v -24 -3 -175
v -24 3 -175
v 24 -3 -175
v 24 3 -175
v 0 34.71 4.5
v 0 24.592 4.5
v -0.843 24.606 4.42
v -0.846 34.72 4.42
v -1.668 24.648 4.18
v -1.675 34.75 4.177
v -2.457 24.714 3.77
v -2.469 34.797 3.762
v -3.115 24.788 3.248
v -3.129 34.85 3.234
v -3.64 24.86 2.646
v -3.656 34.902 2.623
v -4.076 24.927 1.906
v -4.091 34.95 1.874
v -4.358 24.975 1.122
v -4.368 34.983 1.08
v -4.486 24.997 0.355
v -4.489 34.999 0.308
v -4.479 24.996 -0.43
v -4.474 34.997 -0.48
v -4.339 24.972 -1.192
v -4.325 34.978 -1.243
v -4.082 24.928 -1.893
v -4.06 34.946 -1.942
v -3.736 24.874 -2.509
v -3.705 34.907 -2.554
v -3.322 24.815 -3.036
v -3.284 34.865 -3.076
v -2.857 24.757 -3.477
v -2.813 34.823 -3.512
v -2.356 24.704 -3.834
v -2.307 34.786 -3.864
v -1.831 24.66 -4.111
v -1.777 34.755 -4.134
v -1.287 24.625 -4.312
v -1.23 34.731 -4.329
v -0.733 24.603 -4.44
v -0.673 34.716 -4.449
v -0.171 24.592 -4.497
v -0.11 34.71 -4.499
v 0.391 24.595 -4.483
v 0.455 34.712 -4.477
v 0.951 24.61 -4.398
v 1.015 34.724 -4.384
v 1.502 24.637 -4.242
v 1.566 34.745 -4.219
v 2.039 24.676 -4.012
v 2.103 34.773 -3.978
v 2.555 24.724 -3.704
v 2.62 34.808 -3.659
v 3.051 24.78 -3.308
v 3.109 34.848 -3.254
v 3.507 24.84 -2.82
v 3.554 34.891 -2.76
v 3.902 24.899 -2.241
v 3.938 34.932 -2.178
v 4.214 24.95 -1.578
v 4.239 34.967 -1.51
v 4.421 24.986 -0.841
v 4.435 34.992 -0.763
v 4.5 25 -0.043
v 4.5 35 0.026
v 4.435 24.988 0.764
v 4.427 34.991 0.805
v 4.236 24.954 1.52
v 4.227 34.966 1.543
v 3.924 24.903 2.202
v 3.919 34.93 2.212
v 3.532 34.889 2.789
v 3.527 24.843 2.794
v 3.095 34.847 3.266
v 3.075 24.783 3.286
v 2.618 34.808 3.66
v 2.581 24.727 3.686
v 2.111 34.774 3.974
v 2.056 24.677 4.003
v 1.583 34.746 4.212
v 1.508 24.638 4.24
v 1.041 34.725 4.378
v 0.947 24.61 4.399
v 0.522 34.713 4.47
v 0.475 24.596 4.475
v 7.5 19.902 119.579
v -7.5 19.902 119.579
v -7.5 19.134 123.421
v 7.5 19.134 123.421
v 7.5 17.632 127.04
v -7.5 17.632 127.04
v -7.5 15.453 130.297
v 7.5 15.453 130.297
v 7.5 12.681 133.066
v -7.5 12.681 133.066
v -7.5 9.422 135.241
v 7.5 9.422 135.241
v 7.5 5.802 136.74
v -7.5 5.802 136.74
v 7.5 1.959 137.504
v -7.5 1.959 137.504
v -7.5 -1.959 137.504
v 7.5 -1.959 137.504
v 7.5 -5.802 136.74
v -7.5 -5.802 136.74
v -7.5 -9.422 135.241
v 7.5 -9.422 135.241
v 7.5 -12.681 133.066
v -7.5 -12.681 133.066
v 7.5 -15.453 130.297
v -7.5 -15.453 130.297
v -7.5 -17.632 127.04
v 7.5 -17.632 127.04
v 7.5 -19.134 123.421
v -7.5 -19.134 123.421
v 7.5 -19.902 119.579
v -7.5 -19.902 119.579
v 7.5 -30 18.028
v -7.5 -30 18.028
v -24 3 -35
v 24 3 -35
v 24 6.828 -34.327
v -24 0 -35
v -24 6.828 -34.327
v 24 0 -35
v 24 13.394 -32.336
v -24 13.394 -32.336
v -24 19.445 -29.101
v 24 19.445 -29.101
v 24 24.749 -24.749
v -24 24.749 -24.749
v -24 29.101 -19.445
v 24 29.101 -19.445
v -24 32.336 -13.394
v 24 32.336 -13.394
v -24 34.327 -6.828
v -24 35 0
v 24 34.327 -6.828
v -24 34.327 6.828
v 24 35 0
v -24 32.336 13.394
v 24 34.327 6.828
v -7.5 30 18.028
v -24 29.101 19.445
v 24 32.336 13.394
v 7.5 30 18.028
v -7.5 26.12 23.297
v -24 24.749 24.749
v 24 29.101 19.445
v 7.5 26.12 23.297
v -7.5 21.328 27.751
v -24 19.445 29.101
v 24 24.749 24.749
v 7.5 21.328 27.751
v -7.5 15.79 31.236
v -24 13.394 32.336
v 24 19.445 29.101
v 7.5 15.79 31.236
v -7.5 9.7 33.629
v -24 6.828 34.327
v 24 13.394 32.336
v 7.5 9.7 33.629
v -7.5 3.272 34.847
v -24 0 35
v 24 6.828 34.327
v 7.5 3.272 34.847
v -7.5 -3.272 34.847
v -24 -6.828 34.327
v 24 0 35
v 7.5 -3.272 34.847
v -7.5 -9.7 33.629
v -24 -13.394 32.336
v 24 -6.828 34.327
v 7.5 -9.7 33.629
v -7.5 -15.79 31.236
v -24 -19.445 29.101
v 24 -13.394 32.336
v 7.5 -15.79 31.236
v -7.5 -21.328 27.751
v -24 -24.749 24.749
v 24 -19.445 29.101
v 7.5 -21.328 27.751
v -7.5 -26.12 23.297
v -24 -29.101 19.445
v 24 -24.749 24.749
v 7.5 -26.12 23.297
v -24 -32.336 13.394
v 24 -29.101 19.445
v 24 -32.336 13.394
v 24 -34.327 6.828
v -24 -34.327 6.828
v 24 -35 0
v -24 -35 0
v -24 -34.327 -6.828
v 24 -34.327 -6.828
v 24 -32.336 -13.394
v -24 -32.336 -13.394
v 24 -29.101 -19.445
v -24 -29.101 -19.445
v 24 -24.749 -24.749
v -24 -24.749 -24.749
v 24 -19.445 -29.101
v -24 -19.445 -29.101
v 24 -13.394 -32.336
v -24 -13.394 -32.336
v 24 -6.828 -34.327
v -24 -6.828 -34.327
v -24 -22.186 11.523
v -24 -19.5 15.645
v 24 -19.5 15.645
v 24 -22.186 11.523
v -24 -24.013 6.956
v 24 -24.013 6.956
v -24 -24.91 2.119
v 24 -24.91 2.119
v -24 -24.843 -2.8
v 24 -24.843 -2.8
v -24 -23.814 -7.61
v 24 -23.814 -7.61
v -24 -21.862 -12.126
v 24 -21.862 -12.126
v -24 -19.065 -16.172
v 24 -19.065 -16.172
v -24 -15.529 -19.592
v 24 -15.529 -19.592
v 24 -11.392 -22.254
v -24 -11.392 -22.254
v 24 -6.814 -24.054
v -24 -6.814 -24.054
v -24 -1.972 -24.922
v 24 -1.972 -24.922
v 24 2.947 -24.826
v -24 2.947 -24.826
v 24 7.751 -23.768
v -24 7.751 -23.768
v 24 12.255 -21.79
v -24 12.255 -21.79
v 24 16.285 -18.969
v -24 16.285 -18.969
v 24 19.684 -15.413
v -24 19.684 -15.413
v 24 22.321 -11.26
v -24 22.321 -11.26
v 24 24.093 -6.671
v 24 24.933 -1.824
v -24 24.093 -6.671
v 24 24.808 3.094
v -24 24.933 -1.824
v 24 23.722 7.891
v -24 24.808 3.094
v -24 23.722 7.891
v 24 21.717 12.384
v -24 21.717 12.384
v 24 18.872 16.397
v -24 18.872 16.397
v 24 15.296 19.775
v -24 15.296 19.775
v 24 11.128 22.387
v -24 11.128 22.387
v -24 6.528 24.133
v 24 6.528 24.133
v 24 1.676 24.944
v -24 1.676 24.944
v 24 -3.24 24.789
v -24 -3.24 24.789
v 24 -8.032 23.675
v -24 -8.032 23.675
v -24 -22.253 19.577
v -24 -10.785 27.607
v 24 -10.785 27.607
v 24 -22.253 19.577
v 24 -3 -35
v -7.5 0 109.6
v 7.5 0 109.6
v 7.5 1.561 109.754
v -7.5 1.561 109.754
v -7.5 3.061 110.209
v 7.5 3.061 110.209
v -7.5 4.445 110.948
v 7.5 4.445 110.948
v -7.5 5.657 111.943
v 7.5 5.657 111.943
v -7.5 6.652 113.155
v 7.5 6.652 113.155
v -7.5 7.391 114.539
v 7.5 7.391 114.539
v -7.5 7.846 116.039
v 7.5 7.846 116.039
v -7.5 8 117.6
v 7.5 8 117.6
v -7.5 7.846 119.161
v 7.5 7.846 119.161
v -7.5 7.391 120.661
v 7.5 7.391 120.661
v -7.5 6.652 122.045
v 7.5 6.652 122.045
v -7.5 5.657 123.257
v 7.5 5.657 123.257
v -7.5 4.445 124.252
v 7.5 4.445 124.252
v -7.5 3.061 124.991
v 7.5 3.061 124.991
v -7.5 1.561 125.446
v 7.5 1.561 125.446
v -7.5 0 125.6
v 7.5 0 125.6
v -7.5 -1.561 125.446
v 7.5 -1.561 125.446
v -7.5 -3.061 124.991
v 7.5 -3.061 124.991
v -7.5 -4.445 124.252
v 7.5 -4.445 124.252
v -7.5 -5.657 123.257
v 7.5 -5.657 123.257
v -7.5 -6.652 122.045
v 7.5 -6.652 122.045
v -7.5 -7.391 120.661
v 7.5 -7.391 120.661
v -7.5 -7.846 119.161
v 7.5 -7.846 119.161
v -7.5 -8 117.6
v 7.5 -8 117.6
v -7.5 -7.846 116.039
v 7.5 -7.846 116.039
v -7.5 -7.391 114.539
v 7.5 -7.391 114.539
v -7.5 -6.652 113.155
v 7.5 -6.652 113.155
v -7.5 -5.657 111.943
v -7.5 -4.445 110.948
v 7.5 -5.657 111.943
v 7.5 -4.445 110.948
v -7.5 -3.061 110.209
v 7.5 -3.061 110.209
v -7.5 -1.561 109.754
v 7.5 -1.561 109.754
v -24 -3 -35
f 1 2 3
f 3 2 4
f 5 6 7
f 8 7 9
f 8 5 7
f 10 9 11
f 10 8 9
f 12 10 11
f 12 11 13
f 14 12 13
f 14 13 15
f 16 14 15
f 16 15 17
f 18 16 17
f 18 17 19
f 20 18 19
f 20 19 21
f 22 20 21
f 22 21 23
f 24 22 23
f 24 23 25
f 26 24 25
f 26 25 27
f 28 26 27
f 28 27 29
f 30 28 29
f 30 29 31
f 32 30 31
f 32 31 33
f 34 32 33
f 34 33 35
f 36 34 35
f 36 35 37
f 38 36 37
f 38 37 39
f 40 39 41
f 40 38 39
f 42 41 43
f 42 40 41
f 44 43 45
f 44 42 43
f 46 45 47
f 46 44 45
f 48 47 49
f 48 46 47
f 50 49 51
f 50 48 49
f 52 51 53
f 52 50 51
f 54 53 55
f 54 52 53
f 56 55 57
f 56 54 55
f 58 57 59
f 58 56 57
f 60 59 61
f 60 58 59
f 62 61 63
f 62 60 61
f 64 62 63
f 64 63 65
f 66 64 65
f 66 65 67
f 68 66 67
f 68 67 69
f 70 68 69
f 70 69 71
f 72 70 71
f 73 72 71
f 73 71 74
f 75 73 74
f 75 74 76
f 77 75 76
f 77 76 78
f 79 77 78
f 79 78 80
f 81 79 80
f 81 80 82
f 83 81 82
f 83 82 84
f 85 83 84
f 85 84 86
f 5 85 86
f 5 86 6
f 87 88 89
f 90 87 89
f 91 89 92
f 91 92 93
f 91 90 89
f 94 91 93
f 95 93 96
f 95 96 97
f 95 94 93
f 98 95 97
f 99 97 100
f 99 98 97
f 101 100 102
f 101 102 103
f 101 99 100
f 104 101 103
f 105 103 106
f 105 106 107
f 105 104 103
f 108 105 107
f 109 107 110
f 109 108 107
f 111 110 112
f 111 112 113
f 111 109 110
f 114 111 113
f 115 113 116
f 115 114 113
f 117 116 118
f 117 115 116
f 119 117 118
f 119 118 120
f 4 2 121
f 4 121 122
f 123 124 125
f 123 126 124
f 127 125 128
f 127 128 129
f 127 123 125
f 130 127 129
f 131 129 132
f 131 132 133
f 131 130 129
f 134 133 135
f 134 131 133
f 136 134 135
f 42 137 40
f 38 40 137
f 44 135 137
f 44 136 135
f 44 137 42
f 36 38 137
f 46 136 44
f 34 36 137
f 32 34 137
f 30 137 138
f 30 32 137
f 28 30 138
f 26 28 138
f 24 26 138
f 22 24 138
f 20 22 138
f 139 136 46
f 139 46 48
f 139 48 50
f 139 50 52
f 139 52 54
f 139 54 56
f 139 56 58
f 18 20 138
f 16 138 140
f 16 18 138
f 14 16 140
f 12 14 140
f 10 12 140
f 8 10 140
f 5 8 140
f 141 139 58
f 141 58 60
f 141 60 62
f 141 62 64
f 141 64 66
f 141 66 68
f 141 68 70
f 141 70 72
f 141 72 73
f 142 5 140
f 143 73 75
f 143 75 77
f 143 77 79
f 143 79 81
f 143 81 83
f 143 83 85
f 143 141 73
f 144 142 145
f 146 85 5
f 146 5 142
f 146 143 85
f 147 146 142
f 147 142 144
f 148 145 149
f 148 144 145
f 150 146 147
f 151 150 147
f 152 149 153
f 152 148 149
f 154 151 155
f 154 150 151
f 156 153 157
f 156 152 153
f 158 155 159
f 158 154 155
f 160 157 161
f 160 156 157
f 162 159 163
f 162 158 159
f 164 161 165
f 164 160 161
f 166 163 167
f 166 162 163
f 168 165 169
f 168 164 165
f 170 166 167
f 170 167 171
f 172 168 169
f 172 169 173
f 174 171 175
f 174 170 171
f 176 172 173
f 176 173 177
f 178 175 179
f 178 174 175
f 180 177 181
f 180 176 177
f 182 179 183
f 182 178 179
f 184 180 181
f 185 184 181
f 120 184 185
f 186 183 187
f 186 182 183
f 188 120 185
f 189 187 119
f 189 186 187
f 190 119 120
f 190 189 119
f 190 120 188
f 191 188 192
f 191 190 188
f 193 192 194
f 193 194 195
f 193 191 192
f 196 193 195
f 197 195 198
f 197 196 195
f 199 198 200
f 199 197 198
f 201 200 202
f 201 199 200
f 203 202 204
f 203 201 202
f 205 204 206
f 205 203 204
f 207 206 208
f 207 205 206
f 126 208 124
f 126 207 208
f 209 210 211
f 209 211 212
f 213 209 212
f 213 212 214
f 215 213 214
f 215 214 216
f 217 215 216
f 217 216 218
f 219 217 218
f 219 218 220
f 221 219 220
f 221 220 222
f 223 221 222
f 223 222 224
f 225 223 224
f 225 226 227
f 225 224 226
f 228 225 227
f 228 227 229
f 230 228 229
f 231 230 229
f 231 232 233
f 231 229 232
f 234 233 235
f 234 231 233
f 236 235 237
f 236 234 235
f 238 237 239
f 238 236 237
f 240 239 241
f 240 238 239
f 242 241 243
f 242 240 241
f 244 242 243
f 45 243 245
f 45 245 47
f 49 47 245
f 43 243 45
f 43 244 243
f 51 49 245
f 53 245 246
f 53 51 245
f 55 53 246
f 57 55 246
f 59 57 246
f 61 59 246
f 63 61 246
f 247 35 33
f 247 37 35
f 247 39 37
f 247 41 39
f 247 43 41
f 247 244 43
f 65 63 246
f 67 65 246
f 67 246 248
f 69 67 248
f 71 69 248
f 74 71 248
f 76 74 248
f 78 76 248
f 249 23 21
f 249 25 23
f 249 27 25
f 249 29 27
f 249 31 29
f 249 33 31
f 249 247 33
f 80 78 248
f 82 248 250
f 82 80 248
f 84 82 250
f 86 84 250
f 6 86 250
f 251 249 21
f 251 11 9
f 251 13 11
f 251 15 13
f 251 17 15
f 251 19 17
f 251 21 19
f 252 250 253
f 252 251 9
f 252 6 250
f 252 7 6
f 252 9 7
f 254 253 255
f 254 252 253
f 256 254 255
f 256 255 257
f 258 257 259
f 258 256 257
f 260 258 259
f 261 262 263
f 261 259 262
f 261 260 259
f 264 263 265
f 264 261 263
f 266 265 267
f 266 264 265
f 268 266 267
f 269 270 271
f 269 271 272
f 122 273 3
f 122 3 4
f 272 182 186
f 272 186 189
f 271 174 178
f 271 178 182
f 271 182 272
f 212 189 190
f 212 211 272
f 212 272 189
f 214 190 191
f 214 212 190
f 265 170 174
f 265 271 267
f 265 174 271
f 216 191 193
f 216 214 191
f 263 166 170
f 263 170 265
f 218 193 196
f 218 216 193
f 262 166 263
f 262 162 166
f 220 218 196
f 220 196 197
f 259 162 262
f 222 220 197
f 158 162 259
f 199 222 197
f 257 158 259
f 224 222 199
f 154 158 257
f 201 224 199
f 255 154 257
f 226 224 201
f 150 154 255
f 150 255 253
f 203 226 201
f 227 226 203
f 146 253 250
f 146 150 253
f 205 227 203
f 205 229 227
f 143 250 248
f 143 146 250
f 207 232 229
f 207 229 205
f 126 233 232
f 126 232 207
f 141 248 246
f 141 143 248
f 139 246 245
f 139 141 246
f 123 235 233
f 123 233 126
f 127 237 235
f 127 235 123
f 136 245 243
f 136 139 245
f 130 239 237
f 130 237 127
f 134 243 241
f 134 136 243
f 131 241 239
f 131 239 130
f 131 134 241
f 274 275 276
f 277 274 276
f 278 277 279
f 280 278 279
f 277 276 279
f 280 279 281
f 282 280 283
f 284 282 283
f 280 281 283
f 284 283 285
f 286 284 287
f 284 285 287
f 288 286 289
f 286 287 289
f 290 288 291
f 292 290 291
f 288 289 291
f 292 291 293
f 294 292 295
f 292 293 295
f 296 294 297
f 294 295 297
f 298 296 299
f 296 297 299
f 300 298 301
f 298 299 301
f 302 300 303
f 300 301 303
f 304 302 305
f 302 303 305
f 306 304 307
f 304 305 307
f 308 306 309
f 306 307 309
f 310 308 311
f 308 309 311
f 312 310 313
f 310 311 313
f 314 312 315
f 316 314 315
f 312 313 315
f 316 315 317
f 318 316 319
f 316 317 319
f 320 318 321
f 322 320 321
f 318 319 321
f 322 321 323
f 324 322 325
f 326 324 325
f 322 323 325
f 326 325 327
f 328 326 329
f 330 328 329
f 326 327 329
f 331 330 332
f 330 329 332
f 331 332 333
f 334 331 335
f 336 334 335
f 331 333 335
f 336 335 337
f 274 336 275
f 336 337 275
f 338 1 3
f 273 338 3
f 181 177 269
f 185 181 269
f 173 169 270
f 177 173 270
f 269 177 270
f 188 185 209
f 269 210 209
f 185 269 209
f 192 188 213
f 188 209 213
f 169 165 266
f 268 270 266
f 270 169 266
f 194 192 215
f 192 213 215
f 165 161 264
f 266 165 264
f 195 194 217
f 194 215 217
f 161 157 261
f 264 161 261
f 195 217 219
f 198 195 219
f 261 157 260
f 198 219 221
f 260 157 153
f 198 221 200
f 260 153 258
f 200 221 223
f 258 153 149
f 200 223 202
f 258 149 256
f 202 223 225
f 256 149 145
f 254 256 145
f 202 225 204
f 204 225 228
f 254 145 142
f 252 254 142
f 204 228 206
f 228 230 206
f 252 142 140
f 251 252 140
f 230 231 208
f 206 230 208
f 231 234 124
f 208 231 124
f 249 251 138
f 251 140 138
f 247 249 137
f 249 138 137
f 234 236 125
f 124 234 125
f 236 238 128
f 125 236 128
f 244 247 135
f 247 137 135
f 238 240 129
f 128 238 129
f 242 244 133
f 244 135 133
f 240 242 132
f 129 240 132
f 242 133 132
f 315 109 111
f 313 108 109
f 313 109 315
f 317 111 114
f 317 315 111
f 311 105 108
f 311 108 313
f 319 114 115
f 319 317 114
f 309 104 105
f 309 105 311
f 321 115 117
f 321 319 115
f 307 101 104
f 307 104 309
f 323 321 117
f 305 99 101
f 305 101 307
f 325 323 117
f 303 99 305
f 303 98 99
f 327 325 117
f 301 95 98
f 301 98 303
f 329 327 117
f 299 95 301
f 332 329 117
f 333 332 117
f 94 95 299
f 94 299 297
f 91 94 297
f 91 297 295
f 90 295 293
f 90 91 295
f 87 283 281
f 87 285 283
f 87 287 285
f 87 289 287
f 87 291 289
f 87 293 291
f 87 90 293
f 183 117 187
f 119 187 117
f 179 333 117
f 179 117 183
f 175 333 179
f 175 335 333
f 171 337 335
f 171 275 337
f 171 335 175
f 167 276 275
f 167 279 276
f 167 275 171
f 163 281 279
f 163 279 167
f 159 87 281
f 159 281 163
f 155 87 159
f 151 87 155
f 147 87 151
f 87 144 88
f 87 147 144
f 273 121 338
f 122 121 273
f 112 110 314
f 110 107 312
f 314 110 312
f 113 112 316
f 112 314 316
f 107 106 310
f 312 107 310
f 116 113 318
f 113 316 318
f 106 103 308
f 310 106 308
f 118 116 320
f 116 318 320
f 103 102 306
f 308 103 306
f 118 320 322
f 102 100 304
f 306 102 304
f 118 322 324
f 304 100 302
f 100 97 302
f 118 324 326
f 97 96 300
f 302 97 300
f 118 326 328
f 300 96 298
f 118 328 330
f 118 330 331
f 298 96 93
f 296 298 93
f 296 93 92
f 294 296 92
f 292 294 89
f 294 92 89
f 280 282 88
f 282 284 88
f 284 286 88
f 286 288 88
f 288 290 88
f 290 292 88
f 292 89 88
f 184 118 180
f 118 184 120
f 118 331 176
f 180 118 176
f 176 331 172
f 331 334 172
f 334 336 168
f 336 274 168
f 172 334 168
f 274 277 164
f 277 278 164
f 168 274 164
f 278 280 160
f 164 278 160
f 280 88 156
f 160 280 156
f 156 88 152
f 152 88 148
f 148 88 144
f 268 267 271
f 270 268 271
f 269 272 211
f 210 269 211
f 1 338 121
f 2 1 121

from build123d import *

# Parameters (mm, degrees)
SKETCH1_R           = 35
SKETCH1_R_2         = 25
BOSS_EXTRUDE1_DEPTH = 24
BOSS_EXTRUDE2_DEPTH = 7.5
SKETCH3_R           = 8
CUT_EXTRUDE1_DEPTH  = 15
CUT_EXTRUDE2_DEPTH  = 150.875815261
SKETCH6_R           = 4.5
CUT_EXTRUDE3_DEPTH  = 24
SKETCH7_W           = 48
SKETCH7_H           = 6
BOSS_EXTRUDE3_DEPTH = 140


with BuildPart() as part:
    # Sketch1 → Boss-Extrude1 (new, symmetric)
    with BuildSketch(Plane(origin=(0, 0, 0), x_dir=(0, 0, -1), z_dir=(1, 0, 0))):
        Circle(SKETCH1_R)
        Circle(SKETCH1_R_2, mode=Mode.SUBTRACT)
    extrude(amount=BOSS_EXTRUDE1_DEPTH, both=True)

    # Sketch2 → Boss-Extrude2 (add, symmetric)
    with BuildSketch(Plane(origin=(0, 0, 0), x_dir=(0, 0, -1), z_dir=(1, 0, 0))):
        with BuildLine():
            Line((-18.027756377, 30), (-119.579019246, 19.901846216))
            ThreePointArc((-119.579019246, 19.901846216), (-137.6, 0), (-119.579019246, -19.901846216))
            Line((-119.579019246, -19.901846216), (-18.027756377, -30))
            ThreePointArc((-18.027756377, -30), (-35, 0), (-18.027756377, 30))
        make_face()
    extrude(amount=BOSS_EXTRUDE2_DEPTH, both=True)

    # Sketch3 → Cut-Extrude1 (cut)
    with BuildSketch(Plane(origin=(7.5, 0, 0), x_dir=(0, 0, -1), z_dir=(1, 0, 0))):
        with Locations((-117.6, 0)):
            Circle(SKETCH3_R)
    extrude(amount=-CUT_EXTRUDE1_DEPTH, mode=Mode.SUBTRACT)

    # Sketch5 → Cut-Extrude2 (cut, through all)
    with BuildSketch(Plane(origin=(24, 0, 0), x_dir=(0, 0, -1), z_dir=(1, 0, 0))):
        Polygon((-2.570566425, 6.745492133), (-27.60661393, -10.784937057), (-19.576543821, -22.253065677), (5.459503684, -4.722636487), align=None)
    extrude(amount=-CUT_EXTRUDE2_DEPTH, mode=Mode.SUBTRACT)

    # Sketch6 → Cut-Extrude3 (cut)
    with BuildSketch(Plane(origin=(0, 35, -70), x_dir=(1, 0, 0), z_dir=(0, -1, 0))):
        with Locations(Location((0, 70, 0), (0, 0, 90))):
            Circle(SKETCH6_R)
    extrude(amount=CUT_EXTRUDE3_DEPTH, mode=Mode.SUBTRACT)


with BuildPart() as body_2:
    # Sketch7 → Boss-Extrude3 (new body)
    with BuildSketch(Plane.XY.offset(-35)):
        Rectangle(SKETCH7_W, SKETCH7_H)
    extrude(amount=-BOSS_EXTRUDE3_DEPTH)


solid = Compound([part.part, body_2.part])
